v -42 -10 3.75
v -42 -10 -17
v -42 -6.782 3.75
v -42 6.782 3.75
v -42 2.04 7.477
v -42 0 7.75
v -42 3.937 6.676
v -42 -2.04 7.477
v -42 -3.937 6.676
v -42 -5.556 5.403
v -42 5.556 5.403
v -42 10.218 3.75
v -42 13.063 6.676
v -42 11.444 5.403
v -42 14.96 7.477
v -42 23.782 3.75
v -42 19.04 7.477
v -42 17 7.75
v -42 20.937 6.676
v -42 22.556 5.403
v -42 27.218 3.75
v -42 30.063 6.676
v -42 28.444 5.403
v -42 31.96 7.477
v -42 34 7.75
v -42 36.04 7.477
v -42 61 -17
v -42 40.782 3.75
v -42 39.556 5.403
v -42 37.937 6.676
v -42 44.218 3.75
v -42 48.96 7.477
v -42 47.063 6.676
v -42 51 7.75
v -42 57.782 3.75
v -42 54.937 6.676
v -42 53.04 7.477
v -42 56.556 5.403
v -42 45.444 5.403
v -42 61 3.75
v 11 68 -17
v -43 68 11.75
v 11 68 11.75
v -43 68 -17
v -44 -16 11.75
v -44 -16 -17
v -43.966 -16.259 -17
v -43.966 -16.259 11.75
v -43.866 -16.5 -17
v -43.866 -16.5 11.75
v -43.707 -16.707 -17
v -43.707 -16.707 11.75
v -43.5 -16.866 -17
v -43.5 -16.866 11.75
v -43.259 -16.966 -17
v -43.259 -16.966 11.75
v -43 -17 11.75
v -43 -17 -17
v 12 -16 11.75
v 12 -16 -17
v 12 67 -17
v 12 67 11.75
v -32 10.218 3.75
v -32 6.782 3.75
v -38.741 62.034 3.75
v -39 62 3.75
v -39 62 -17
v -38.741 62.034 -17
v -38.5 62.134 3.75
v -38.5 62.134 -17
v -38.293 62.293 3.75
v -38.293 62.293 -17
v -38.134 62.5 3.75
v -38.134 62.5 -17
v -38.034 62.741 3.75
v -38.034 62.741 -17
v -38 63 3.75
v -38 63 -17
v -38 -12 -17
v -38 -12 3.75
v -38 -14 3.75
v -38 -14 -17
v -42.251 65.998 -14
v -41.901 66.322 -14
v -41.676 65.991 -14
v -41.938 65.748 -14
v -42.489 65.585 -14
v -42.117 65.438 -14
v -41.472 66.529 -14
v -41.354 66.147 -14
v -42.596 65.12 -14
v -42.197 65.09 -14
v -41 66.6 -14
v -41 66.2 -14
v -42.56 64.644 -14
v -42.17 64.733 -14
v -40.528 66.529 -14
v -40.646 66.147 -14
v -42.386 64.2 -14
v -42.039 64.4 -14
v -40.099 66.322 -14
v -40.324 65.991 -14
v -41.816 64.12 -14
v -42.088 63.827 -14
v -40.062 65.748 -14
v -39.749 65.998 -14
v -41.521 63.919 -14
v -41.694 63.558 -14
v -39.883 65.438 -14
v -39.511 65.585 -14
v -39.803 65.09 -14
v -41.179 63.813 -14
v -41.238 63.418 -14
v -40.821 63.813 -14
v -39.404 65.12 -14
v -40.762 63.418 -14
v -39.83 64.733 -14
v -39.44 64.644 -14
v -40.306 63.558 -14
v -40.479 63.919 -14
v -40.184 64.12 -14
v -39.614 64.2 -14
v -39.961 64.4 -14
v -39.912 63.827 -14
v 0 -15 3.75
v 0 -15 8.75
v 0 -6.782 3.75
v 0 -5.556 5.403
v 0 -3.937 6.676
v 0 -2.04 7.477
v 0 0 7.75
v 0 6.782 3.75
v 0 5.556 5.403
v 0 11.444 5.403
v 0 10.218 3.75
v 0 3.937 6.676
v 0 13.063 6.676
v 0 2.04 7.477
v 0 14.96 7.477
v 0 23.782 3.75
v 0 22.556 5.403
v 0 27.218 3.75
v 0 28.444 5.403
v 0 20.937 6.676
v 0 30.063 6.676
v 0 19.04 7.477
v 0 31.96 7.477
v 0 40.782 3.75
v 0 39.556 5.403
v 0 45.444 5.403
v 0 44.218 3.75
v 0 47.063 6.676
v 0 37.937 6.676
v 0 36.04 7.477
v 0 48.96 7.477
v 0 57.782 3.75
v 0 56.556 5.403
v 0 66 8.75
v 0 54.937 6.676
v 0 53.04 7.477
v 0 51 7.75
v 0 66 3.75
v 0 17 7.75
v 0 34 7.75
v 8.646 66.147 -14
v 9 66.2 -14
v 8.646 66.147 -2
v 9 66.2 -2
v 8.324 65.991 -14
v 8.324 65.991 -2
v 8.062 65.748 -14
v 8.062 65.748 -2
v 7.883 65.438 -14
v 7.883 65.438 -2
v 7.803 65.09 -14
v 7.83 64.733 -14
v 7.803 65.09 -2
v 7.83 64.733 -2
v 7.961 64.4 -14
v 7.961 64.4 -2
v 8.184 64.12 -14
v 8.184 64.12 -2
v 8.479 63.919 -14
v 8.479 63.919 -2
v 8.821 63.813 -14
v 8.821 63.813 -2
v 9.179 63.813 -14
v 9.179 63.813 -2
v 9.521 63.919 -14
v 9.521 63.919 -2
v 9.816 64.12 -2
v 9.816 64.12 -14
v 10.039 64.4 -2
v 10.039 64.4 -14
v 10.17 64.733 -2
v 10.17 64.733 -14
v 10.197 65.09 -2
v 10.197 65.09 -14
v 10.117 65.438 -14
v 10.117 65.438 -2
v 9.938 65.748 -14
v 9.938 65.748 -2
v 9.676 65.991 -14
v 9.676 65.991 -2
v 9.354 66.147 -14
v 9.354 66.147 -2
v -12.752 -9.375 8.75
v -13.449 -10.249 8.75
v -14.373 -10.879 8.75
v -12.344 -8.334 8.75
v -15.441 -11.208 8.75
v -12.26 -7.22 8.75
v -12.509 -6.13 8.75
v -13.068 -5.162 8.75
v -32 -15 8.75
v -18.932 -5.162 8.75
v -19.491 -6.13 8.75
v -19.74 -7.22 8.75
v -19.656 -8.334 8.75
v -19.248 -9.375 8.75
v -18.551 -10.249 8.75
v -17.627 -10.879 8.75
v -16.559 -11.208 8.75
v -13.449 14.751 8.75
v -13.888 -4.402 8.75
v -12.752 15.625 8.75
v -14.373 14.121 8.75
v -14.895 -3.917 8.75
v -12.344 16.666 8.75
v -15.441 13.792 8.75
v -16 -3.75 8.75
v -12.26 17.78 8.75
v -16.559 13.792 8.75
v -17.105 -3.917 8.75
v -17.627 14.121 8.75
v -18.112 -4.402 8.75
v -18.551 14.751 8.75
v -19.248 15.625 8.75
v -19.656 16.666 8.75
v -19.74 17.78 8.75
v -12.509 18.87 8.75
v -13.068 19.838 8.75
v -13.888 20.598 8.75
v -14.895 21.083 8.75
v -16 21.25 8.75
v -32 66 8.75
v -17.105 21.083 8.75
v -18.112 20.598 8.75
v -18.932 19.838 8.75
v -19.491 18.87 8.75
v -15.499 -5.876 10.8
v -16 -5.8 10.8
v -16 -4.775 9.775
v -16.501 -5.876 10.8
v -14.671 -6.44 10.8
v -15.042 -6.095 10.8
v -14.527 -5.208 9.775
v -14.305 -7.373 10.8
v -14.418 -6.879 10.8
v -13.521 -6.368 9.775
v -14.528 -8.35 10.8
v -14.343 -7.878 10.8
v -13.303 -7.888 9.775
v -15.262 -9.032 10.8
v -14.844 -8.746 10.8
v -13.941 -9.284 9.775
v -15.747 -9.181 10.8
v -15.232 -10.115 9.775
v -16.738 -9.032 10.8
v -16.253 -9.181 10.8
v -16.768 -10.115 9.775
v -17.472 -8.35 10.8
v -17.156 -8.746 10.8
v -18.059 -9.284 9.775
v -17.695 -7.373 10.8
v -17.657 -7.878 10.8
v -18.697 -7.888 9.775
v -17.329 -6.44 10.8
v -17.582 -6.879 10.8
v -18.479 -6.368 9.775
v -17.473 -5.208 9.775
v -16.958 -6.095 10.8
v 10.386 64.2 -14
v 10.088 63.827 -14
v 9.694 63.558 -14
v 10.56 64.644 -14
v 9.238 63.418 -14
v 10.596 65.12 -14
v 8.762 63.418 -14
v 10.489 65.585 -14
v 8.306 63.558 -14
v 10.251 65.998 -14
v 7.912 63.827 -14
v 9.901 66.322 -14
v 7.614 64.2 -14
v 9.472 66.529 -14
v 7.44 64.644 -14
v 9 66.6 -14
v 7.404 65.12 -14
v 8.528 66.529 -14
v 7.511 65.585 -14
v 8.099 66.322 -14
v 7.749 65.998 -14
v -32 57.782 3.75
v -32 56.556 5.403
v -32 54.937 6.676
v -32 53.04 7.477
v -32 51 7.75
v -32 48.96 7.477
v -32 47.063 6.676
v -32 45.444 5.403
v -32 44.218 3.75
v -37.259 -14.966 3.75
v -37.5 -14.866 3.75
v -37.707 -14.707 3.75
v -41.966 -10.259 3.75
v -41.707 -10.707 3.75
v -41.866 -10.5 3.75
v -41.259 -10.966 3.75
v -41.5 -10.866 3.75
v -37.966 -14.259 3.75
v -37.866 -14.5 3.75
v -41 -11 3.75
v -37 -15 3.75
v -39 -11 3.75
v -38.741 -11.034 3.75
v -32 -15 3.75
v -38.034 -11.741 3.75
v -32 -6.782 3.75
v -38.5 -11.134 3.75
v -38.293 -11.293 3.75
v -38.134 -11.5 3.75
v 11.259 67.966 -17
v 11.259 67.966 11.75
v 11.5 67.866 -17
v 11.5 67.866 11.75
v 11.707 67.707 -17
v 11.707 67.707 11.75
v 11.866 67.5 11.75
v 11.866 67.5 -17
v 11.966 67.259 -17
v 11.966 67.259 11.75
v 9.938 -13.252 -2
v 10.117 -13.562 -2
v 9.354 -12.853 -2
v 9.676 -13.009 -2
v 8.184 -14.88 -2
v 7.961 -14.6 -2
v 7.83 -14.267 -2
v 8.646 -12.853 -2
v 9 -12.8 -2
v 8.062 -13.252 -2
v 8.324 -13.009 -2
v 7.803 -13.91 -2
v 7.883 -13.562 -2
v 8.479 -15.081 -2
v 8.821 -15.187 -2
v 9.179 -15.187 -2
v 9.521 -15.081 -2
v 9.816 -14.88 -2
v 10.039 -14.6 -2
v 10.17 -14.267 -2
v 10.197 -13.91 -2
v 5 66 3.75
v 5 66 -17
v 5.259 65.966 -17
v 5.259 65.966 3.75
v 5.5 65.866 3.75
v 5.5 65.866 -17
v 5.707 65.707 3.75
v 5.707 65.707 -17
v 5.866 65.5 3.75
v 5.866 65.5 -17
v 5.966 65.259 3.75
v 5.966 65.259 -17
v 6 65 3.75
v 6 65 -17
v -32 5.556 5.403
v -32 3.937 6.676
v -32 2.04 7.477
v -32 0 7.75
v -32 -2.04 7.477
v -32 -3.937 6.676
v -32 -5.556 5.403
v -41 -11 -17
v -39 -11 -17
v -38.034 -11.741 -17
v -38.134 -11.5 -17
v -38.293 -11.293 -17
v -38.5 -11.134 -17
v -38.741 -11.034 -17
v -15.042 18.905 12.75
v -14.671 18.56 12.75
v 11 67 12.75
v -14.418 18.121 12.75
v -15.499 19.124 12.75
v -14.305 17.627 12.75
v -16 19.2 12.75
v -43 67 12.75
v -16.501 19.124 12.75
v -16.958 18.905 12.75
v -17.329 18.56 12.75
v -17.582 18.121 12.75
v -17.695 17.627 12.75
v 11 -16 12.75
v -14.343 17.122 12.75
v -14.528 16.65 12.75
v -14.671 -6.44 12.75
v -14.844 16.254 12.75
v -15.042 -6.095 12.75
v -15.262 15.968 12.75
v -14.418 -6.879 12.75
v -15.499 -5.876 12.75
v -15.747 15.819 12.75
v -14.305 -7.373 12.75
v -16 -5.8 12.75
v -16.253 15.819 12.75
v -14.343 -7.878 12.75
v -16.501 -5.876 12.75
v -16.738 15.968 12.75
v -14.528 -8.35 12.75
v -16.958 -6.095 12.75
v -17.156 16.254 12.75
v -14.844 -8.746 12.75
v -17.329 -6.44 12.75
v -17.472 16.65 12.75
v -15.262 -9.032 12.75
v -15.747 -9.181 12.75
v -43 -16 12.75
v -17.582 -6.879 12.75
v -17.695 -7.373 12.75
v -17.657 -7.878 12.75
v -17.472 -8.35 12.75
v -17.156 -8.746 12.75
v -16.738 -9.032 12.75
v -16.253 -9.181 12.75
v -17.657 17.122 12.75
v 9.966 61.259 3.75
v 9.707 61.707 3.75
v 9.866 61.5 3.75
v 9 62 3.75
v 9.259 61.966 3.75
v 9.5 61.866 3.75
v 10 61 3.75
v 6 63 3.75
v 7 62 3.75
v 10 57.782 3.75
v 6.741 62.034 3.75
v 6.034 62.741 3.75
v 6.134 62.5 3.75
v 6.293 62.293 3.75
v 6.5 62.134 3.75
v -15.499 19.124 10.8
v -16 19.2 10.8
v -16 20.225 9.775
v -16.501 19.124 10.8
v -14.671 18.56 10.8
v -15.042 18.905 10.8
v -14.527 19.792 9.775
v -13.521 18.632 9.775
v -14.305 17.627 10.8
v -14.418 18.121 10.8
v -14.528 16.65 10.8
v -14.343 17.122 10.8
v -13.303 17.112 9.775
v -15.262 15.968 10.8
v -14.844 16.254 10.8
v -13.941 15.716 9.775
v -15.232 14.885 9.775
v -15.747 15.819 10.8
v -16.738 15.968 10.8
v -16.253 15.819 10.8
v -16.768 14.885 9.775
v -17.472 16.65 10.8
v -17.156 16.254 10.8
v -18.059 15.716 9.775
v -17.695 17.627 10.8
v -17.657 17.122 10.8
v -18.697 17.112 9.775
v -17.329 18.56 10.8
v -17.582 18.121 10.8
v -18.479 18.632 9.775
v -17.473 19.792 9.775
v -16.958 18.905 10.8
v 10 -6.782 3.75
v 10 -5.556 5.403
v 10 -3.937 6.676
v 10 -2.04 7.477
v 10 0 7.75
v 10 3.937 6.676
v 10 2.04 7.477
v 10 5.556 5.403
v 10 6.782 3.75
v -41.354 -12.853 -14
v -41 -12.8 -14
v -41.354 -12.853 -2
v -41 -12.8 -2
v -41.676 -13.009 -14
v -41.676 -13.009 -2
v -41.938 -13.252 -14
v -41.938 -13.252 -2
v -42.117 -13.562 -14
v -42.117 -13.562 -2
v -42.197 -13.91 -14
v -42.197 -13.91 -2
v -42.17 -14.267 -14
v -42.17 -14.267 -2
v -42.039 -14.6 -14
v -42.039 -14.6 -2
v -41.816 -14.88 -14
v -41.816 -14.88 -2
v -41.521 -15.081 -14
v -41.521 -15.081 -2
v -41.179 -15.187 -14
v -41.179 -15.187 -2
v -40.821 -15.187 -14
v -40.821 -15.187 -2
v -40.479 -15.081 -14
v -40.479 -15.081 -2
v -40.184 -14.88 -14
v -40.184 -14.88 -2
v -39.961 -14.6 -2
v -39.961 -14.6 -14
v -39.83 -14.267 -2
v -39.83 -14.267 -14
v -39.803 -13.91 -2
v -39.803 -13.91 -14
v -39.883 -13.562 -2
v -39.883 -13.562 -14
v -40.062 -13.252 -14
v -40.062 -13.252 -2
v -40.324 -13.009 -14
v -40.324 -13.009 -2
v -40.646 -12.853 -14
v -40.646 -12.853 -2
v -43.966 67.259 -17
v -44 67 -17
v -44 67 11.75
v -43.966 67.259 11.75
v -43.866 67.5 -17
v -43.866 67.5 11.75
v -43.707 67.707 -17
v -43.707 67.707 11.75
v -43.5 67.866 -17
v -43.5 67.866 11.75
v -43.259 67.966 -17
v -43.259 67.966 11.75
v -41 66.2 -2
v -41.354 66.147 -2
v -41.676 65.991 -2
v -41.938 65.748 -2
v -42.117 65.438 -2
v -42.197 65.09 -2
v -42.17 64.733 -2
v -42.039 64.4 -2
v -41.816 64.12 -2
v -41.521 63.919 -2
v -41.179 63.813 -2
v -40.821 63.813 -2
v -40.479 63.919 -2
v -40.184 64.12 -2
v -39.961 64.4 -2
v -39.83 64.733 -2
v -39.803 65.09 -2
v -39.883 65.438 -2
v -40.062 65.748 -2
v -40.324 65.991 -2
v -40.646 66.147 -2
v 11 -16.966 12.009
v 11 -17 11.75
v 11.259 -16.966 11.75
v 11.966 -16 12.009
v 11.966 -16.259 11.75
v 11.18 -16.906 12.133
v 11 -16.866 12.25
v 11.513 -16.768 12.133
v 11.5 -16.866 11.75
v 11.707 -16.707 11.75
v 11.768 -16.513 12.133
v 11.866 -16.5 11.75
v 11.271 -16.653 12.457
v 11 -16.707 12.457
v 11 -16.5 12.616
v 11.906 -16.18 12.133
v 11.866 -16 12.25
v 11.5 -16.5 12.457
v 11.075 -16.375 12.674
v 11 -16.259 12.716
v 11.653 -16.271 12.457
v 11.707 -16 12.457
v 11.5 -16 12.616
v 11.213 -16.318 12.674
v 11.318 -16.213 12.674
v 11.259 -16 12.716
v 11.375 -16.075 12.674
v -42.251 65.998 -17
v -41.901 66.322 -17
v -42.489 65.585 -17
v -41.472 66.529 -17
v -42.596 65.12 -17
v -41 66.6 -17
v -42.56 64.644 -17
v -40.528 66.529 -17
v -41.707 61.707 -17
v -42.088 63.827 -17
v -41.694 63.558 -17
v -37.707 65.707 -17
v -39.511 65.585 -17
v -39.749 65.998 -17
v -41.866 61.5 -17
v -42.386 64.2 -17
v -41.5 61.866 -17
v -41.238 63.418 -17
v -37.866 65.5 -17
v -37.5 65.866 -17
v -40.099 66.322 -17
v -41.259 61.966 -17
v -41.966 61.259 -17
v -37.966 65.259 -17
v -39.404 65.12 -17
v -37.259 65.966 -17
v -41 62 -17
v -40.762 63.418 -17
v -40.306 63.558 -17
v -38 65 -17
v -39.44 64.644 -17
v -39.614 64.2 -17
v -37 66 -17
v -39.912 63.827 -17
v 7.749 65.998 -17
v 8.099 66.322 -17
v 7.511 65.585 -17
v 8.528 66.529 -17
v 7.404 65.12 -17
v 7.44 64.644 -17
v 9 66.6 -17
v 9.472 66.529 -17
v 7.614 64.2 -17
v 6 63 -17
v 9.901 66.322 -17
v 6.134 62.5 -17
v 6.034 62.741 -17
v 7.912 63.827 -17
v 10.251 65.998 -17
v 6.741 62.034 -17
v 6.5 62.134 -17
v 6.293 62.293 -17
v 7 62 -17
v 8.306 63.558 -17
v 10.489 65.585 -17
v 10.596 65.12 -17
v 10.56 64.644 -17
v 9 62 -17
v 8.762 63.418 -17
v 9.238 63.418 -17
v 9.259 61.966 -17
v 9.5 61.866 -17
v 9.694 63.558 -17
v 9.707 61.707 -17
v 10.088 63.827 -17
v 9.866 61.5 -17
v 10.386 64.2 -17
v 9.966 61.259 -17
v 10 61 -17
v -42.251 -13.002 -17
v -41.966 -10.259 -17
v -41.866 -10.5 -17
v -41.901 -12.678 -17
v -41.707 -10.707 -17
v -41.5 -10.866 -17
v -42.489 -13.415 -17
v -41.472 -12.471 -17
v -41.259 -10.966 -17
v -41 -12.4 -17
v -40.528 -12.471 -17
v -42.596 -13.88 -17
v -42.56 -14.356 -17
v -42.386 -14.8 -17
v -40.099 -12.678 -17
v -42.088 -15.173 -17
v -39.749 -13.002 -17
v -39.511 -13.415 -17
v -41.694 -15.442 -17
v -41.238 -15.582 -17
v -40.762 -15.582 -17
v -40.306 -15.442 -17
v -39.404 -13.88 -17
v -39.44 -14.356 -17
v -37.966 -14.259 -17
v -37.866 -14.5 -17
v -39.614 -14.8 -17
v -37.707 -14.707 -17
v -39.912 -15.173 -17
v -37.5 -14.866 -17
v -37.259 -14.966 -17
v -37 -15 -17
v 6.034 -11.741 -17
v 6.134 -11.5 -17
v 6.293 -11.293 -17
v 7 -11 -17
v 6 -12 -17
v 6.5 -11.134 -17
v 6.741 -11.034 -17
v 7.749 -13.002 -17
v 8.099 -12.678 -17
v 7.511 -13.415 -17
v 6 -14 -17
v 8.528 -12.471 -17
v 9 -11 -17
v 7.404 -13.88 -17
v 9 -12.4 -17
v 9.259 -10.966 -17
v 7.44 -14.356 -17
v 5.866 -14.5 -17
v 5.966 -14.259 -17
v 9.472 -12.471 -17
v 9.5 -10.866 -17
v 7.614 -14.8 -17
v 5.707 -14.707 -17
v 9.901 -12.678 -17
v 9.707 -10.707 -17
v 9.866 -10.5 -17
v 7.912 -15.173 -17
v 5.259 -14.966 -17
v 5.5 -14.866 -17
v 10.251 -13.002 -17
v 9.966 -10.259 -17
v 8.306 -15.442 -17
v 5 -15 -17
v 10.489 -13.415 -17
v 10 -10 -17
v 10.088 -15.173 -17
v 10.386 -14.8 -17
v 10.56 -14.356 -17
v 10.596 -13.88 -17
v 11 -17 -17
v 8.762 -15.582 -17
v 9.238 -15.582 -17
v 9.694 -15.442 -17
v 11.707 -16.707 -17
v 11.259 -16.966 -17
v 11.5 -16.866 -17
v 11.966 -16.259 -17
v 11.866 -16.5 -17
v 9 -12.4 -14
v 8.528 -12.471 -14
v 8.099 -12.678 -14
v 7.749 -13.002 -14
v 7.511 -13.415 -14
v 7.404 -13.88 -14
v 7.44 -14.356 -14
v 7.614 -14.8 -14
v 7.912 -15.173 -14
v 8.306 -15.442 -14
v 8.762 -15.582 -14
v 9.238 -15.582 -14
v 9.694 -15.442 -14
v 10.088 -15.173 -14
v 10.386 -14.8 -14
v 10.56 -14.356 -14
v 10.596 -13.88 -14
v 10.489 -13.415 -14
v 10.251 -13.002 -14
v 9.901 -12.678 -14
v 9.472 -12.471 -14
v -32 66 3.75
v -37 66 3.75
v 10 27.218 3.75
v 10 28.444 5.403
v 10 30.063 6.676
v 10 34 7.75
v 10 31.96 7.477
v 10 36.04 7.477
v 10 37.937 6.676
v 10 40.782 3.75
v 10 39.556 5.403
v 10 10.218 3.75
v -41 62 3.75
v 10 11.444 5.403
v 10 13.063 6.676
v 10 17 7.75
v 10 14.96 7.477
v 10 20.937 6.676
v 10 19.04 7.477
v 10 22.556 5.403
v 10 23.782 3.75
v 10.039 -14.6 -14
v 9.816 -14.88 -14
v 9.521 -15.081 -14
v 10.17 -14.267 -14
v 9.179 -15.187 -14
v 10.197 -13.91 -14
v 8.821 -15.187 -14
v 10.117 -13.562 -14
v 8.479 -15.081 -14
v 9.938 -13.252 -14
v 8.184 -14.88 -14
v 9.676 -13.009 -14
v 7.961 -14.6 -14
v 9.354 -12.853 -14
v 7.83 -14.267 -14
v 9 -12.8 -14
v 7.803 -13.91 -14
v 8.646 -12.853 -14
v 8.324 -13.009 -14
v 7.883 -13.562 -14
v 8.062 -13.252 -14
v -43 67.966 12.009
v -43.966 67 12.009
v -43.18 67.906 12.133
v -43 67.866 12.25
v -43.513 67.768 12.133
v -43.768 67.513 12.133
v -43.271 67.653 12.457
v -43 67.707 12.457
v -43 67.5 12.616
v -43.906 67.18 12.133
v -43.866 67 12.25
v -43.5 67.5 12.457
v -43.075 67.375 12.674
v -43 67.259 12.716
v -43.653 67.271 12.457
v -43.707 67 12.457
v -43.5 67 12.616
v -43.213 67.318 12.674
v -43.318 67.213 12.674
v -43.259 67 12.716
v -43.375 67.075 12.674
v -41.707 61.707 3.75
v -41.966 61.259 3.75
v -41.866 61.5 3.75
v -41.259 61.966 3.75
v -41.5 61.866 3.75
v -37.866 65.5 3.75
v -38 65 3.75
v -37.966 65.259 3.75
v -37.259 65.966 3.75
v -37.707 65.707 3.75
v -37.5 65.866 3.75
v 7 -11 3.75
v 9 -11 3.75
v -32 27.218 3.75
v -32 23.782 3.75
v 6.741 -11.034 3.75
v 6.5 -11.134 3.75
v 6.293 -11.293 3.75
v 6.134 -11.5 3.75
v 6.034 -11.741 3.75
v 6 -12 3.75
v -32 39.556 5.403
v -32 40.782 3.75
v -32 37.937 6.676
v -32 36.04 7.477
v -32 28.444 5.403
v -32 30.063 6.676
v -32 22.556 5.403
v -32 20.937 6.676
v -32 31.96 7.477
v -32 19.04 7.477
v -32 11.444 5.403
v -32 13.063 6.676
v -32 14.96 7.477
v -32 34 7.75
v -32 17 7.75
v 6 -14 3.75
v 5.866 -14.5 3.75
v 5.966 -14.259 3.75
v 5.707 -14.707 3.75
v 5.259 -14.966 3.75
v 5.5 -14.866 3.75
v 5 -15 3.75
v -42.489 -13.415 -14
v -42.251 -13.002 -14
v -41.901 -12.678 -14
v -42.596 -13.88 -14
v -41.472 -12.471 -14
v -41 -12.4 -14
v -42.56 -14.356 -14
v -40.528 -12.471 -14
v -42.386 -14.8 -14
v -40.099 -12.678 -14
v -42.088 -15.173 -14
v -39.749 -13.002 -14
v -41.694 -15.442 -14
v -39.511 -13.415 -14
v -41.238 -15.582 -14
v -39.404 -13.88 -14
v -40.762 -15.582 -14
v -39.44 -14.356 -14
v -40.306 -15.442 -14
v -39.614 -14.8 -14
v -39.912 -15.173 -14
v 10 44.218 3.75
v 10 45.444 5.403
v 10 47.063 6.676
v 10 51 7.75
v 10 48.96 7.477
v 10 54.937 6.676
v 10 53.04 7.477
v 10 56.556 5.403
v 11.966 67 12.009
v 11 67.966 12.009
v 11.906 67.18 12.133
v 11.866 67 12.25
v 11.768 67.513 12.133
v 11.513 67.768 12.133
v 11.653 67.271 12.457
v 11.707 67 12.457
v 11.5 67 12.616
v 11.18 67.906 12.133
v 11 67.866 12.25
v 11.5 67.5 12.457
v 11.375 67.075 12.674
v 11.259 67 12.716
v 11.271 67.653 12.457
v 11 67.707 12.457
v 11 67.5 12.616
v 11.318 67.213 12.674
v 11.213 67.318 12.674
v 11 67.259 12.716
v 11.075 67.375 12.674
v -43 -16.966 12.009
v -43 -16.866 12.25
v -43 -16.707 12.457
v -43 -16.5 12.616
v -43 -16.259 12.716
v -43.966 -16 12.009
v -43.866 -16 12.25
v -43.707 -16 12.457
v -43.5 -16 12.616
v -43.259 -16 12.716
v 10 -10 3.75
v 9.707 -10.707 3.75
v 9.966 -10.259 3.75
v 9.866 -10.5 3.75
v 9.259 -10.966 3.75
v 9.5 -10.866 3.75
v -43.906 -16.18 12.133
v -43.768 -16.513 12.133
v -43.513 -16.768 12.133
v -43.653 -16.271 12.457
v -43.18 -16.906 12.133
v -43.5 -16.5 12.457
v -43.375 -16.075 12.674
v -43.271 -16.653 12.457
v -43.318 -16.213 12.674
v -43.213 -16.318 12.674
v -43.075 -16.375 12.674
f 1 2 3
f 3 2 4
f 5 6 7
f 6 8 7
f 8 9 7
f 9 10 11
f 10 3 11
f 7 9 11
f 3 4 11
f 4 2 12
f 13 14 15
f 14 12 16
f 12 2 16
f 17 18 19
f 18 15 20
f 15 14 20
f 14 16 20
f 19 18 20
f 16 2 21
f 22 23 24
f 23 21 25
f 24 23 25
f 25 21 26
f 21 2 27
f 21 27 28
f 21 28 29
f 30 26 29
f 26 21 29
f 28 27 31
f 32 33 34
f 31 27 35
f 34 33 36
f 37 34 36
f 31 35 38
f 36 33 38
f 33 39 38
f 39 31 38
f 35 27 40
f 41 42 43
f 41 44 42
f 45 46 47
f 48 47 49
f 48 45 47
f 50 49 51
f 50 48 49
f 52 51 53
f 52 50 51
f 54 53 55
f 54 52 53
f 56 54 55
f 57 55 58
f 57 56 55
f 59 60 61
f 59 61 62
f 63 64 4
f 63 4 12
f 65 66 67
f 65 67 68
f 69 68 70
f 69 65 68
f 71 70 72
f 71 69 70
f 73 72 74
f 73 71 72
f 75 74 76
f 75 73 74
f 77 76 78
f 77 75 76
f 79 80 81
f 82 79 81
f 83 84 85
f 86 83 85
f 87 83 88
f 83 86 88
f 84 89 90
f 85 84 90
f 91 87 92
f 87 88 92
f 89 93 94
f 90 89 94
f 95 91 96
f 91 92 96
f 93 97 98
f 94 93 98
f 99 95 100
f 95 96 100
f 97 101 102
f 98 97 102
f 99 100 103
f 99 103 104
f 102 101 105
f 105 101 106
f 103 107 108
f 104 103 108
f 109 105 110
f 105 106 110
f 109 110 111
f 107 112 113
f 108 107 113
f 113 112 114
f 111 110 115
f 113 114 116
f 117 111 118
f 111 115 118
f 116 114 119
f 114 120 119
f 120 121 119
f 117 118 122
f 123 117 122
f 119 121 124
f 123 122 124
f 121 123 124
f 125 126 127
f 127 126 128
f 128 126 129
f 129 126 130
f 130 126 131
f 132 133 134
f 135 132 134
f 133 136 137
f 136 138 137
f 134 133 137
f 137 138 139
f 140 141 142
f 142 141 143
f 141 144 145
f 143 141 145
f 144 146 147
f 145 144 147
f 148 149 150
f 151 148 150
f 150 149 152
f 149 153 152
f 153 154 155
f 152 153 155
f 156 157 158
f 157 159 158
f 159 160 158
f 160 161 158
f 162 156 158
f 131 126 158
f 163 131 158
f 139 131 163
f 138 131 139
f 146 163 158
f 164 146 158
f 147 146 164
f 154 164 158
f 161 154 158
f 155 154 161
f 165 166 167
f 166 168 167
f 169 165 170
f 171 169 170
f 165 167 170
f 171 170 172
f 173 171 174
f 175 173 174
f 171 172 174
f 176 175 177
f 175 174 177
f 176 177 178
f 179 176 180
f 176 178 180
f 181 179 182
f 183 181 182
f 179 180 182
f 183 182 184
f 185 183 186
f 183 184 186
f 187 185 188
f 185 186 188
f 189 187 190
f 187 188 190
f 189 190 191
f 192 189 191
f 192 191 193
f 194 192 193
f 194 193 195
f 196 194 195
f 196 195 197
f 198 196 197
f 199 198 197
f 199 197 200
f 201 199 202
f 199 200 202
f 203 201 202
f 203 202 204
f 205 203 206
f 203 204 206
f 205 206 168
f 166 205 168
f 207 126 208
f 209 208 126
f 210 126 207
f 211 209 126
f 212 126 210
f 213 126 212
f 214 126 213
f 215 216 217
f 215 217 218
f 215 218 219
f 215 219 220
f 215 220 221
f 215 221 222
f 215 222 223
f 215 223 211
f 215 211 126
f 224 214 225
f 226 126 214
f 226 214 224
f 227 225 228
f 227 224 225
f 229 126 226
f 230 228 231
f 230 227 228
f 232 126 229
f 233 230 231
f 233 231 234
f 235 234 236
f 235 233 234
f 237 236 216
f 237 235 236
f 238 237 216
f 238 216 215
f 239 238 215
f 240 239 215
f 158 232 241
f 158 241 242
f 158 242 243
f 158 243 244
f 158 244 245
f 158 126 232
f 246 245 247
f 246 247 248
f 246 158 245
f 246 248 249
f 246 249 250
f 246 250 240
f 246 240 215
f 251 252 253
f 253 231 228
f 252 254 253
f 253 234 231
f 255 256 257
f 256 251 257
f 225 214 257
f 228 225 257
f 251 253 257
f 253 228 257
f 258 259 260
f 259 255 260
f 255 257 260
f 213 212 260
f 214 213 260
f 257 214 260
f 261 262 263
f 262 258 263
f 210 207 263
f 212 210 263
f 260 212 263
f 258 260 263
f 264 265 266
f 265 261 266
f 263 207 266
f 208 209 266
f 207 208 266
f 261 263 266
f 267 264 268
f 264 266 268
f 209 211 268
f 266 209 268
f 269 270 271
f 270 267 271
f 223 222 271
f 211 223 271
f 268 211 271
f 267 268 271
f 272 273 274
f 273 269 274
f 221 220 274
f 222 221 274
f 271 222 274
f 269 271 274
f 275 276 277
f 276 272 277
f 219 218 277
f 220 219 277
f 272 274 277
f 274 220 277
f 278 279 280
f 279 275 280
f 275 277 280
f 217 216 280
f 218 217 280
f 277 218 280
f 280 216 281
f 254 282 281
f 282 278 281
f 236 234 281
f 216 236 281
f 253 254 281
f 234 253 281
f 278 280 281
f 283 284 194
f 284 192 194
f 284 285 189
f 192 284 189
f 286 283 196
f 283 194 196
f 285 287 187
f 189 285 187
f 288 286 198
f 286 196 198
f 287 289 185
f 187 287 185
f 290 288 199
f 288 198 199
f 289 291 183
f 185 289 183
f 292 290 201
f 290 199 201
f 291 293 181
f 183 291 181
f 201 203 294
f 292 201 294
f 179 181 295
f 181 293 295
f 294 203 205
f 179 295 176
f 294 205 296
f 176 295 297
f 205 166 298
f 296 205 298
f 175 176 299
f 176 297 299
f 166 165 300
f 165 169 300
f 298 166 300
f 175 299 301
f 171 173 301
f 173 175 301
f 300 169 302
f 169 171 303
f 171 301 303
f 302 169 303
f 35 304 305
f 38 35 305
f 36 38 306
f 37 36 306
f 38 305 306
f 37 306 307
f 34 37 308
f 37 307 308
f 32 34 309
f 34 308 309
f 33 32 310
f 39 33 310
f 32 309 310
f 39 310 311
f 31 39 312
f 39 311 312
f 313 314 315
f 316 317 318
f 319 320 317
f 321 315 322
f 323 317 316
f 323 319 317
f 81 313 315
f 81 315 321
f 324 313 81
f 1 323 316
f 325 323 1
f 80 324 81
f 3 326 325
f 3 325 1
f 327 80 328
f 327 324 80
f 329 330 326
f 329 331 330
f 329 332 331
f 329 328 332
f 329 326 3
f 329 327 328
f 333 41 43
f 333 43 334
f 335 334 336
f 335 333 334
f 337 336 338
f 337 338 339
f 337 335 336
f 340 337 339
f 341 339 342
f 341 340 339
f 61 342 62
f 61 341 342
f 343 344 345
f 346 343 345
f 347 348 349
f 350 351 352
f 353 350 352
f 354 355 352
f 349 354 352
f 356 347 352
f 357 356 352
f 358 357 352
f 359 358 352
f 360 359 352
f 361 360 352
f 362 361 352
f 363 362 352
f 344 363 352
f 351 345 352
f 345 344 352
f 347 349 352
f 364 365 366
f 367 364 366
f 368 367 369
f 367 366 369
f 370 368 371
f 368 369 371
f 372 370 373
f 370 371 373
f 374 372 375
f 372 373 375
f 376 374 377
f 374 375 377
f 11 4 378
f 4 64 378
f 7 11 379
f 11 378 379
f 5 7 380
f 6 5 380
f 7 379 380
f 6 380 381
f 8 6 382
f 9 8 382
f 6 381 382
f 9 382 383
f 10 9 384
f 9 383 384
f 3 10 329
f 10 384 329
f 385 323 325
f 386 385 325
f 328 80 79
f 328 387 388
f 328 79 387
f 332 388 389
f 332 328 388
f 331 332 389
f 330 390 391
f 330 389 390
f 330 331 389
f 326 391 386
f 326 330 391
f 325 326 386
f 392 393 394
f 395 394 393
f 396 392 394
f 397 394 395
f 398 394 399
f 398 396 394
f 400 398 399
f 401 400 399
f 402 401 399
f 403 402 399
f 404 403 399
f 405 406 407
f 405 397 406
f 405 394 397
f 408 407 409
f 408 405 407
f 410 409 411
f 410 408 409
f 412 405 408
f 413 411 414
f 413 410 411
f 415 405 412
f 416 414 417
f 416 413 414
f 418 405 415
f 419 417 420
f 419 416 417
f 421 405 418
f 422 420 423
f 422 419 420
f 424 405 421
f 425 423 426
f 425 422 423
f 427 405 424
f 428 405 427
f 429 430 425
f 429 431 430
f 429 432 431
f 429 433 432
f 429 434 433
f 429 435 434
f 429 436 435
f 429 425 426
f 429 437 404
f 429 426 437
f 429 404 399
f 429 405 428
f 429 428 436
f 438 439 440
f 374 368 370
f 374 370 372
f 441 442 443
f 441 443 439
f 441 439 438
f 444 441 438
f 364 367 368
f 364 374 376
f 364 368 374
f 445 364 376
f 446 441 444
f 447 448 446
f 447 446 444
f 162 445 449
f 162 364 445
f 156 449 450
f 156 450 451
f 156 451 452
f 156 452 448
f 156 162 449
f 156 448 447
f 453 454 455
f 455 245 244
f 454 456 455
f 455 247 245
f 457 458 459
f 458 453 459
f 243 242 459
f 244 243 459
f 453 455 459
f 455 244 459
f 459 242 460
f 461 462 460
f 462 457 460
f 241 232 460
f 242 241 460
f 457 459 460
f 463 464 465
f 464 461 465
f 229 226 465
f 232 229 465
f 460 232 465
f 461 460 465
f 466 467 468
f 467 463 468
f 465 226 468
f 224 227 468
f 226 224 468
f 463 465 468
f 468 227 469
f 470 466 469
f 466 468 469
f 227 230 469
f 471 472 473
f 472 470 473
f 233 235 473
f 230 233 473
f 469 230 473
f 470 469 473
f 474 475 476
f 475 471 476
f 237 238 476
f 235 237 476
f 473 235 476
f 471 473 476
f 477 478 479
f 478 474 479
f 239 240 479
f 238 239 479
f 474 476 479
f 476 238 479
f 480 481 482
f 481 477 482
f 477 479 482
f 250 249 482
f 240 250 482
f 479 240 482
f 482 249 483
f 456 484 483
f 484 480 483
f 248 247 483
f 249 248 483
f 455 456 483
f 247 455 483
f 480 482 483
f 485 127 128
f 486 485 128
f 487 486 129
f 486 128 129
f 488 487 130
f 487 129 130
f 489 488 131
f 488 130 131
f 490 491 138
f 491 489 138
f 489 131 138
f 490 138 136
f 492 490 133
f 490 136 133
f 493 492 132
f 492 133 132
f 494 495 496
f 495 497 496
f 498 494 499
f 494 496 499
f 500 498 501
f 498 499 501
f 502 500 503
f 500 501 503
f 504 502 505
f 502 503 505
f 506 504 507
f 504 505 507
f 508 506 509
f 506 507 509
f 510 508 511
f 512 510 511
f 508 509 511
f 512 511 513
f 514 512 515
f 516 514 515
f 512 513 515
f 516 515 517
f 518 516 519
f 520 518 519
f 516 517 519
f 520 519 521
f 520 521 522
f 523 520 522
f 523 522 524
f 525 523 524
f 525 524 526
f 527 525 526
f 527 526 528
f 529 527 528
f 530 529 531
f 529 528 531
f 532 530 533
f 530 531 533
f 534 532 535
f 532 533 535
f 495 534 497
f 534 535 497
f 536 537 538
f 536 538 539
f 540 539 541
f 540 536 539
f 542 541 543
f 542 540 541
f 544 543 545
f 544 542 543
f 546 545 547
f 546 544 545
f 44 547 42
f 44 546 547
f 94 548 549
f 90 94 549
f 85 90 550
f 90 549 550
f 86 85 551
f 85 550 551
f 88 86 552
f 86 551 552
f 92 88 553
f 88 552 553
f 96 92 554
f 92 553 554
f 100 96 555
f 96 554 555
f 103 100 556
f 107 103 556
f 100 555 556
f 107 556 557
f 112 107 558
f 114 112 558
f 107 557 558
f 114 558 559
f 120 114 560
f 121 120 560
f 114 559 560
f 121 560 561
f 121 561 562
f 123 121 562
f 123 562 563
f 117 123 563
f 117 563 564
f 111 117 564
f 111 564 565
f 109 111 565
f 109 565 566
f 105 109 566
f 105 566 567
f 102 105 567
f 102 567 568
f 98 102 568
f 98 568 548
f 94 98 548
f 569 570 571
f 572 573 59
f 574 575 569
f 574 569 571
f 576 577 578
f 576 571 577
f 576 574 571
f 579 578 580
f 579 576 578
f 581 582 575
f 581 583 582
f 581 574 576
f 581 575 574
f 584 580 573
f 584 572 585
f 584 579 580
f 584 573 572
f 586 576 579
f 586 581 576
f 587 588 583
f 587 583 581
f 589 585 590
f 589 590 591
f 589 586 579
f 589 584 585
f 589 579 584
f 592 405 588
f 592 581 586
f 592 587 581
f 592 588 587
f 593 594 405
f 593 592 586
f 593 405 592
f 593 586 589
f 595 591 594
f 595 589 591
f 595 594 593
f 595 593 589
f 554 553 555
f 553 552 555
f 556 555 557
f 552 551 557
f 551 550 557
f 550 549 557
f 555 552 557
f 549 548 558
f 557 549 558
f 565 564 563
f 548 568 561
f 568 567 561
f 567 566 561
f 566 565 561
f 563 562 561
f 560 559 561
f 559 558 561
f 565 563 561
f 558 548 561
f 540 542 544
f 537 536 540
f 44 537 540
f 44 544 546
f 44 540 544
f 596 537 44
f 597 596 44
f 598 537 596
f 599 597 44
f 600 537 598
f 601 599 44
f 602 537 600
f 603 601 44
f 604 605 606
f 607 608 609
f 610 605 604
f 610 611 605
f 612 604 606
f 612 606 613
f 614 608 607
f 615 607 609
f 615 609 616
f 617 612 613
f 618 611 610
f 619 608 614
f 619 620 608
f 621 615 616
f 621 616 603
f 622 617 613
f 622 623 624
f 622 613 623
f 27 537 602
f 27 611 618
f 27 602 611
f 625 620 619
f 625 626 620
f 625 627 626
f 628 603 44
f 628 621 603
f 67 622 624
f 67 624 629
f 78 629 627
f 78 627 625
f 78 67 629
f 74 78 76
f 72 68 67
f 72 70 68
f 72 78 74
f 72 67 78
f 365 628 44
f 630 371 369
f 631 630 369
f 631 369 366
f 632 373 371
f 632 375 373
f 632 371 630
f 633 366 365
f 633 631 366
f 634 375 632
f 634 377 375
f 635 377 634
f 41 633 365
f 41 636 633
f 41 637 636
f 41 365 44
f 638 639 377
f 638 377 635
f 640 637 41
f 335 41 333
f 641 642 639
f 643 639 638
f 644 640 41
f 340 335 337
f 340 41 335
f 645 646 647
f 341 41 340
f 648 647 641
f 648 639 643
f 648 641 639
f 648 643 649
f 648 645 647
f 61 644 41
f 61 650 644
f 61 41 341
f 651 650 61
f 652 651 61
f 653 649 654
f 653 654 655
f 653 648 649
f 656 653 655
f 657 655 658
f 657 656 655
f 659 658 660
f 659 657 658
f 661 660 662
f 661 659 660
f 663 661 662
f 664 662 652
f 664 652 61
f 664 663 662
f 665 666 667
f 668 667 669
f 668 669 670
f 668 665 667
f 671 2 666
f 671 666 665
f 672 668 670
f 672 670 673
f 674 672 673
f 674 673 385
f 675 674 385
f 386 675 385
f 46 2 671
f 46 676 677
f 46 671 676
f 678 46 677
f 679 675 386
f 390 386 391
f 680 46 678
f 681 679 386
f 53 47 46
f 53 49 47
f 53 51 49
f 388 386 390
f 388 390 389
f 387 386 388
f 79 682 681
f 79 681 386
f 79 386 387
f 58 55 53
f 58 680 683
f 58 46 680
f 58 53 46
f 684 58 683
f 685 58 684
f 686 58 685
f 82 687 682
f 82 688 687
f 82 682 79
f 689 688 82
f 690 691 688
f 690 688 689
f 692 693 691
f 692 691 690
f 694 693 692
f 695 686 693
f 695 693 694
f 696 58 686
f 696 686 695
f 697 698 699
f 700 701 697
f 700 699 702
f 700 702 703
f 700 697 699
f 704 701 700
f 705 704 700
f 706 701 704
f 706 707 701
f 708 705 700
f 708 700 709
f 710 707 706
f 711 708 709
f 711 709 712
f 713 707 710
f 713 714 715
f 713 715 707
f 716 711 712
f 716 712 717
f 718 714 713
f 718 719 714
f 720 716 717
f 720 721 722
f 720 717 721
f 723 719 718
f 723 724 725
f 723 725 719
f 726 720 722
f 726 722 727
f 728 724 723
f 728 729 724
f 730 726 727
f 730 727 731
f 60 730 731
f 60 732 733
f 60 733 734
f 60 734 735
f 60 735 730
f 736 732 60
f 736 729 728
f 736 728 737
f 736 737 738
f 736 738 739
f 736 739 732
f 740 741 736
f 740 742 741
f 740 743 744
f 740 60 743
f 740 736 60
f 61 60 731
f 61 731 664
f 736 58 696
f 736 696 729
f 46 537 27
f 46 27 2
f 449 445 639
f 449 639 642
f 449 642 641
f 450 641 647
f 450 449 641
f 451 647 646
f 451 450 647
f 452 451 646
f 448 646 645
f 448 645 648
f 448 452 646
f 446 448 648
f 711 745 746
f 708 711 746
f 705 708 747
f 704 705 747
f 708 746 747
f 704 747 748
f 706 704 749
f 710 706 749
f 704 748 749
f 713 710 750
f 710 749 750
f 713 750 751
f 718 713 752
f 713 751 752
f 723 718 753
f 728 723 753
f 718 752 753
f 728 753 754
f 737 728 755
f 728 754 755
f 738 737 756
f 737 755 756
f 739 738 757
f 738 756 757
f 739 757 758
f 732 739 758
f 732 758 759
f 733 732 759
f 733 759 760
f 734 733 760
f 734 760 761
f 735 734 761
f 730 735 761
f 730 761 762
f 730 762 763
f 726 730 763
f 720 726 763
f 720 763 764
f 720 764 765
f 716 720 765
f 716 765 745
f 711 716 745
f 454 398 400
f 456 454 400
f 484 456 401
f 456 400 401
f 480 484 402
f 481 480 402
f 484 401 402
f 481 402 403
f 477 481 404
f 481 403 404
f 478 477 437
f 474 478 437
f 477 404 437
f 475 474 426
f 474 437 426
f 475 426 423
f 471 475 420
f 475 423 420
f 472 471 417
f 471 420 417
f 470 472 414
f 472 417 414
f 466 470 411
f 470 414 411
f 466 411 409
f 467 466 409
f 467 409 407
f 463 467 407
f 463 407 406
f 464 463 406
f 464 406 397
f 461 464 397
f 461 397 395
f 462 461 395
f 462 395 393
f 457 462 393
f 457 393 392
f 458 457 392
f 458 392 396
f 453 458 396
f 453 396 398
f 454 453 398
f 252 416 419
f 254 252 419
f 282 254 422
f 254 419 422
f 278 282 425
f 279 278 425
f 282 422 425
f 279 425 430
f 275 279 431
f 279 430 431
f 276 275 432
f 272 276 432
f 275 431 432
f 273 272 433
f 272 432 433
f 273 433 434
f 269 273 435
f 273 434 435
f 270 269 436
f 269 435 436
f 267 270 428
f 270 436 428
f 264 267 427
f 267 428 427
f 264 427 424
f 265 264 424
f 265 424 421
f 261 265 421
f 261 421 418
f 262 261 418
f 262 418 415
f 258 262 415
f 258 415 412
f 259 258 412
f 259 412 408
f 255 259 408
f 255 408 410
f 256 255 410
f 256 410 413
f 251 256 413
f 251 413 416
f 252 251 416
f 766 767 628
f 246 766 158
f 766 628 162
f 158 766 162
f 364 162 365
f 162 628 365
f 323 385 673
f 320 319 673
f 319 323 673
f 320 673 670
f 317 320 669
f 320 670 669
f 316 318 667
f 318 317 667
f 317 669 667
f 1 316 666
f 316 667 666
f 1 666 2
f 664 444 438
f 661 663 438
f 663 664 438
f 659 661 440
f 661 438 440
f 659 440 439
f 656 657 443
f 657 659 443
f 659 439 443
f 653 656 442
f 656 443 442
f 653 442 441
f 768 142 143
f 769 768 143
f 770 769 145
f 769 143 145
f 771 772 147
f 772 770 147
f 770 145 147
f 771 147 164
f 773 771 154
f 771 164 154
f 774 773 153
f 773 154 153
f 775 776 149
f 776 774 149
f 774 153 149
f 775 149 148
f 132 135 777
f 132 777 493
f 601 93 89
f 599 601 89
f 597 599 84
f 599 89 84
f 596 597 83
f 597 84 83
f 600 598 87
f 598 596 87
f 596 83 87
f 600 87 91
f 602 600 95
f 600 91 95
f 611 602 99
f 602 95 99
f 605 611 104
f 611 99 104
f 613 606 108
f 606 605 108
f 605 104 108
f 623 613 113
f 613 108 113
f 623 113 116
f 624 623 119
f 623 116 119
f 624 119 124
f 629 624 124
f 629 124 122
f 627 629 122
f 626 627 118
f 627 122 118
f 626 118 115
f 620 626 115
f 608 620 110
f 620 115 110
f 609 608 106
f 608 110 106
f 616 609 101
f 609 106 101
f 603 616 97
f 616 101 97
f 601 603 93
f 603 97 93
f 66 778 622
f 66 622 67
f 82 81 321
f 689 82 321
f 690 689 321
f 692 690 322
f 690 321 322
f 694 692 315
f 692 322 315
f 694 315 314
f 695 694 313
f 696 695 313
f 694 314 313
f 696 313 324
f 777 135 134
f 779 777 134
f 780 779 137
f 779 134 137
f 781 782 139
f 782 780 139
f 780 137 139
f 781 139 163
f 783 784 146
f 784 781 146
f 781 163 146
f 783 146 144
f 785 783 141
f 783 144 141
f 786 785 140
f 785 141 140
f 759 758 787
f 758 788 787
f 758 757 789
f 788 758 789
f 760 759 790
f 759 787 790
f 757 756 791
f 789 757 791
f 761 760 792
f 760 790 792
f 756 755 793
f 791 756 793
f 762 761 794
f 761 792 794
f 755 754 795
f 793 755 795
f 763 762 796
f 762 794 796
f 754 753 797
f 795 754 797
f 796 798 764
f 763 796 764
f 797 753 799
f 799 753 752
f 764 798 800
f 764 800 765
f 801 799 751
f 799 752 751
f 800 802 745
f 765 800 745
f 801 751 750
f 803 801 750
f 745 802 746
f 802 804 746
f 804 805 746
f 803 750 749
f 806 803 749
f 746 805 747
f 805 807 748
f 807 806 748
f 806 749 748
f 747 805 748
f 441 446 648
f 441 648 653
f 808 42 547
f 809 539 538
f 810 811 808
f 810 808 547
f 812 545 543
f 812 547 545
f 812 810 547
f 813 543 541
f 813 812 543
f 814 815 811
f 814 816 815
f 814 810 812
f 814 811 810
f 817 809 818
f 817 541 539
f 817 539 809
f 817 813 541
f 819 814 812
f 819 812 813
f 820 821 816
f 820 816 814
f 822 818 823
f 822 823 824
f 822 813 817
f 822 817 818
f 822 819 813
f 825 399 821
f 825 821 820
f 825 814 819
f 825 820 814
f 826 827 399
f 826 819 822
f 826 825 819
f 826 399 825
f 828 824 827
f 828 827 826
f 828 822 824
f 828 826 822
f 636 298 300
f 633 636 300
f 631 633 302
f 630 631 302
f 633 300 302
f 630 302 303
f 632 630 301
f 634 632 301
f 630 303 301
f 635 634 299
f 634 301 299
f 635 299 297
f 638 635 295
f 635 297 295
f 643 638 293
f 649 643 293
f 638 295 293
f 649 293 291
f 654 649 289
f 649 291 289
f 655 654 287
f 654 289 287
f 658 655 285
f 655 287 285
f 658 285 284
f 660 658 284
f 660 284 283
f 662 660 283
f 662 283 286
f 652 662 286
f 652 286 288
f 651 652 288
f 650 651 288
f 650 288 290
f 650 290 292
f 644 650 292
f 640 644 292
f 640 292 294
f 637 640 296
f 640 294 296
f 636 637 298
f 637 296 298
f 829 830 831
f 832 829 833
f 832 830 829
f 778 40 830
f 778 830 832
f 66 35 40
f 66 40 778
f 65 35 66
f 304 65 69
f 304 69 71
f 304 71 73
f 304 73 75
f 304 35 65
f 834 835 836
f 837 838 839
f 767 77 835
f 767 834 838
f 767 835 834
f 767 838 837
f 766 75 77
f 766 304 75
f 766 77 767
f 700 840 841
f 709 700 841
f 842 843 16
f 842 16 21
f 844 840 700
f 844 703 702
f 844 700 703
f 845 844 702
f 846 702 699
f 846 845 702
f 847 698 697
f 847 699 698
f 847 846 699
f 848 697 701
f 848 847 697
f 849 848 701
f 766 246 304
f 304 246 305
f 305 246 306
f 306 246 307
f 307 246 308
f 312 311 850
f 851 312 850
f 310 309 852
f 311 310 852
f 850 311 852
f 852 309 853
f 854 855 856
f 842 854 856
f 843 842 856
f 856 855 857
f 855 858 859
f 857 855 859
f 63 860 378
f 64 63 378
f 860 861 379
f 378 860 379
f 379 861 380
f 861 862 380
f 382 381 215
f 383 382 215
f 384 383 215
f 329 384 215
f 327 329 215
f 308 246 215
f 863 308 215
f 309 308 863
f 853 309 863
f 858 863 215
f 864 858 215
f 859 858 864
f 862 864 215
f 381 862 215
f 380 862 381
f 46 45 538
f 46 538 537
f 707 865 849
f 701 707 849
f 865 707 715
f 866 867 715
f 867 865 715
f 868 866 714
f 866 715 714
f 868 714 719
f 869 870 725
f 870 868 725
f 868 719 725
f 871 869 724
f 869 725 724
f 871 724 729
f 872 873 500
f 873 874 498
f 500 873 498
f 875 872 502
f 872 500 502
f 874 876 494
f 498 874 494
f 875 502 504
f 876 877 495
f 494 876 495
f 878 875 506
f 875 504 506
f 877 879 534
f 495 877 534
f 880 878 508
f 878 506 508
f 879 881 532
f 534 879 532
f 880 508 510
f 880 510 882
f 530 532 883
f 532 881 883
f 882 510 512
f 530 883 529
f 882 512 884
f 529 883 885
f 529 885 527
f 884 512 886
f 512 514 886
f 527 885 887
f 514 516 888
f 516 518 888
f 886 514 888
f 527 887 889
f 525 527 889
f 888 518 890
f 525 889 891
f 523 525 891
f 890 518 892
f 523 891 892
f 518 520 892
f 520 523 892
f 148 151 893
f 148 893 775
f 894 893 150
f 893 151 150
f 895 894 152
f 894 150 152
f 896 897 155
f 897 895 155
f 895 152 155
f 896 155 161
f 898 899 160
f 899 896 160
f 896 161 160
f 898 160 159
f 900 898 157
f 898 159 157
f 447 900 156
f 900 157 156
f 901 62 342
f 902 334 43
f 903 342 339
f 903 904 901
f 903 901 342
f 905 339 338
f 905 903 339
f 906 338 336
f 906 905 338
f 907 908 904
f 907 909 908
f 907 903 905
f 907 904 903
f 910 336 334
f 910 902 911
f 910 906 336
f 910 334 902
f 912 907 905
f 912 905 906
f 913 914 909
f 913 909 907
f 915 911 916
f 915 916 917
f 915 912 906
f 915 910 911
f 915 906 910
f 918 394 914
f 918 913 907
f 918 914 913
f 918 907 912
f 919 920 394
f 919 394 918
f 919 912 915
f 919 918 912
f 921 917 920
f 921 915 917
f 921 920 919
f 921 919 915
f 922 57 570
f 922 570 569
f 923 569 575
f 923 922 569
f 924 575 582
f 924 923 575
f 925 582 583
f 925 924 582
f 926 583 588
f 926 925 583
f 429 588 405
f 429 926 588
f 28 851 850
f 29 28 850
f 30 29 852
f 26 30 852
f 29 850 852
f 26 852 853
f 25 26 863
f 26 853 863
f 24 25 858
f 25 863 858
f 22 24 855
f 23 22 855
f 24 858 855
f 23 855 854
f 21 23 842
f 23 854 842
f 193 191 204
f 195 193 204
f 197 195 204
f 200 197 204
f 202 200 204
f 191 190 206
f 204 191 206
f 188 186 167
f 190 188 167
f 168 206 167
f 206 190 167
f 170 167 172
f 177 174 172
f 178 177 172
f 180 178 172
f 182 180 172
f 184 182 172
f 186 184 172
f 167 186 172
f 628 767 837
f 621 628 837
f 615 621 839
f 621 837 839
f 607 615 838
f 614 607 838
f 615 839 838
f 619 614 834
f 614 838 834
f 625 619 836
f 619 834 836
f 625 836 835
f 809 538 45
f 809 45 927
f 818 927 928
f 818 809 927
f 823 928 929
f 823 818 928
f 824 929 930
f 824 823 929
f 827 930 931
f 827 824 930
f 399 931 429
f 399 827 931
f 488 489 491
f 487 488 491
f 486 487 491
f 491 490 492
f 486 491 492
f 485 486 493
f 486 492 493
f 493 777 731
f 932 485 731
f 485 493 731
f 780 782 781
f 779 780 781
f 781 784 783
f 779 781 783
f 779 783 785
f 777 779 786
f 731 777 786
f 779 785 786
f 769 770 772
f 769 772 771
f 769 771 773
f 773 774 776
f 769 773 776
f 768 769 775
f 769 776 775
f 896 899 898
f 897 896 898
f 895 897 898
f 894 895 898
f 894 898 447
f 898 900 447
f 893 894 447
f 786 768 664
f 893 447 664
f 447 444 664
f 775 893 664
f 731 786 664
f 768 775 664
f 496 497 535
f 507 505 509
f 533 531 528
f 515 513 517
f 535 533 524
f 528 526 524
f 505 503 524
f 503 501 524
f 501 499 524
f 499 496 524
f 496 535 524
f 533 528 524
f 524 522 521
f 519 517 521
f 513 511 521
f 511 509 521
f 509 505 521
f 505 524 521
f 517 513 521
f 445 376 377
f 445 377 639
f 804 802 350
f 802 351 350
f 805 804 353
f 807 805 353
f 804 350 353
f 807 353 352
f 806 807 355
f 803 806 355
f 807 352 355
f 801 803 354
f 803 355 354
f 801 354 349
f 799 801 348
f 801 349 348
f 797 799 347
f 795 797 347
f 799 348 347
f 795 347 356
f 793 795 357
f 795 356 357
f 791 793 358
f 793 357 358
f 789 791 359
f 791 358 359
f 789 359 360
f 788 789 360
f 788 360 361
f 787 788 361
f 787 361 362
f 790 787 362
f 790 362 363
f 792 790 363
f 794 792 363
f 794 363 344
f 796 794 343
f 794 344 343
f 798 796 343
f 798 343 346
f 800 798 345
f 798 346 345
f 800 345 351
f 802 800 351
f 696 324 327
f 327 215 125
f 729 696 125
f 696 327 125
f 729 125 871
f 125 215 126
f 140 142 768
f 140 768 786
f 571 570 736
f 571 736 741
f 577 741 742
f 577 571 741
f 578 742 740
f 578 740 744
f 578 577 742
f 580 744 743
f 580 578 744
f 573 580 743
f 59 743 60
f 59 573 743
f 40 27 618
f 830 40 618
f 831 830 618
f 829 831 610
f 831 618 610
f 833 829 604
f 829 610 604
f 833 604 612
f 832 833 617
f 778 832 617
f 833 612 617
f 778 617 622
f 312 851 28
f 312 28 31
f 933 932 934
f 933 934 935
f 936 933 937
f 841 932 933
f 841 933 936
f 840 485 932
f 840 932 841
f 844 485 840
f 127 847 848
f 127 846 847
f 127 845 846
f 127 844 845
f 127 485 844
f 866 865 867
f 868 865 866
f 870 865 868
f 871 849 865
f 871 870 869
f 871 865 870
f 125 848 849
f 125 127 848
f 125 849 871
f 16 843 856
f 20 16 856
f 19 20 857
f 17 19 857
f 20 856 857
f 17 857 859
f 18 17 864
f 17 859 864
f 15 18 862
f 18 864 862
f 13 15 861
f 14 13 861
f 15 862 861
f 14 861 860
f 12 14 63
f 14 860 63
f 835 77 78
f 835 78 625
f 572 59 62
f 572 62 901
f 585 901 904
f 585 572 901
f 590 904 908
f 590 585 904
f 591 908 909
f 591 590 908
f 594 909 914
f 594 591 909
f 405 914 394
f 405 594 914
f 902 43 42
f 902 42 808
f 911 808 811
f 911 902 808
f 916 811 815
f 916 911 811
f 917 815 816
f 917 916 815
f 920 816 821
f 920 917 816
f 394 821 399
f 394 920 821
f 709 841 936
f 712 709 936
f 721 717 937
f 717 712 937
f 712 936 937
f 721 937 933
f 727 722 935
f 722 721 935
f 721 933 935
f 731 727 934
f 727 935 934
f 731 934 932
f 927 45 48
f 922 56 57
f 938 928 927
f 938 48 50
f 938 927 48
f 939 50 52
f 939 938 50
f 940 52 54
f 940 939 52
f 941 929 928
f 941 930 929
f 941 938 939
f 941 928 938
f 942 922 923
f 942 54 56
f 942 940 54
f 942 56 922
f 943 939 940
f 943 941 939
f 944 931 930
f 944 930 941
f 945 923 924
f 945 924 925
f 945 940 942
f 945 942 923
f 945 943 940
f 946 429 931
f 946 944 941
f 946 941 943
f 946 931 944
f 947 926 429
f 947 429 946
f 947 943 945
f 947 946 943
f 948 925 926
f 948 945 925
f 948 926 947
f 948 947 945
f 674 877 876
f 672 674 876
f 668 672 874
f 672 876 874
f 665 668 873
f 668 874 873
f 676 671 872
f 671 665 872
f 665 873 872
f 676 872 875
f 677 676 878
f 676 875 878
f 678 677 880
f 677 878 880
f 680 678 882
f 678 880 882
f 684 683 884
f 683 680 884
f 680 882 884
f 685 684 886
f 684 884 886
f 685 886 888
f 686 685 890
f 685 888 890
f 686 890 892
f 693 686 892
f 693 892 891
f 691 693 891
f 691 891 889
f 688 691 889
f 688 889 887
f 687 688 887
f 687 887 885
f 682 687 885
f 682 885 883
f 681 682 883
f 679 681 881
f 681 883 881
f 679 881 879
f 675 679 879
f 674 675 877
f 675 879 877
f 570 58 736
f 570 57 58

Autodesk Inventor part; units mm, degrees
ref_plane "YZ Plane" through (0, 0, 0) normal (1, 0, 0) x (0, 1, 0)
ref_plane "XZ Plane" through (0, 0, 0) normal (0, 1, 0) x (-1, 0, 0)
ref_plane "XY Plane" through (0, 0, 0) normal (0, 0, 1) x (1, 0, 0)
sketch "Skizze1" plane through (0, 0, 0) normal (1, 0, 0) x (0, 1, 0)
  circle A0 centre (0, 0) radius 7.75
  line L0 (0, 0) -> (7.75, 0) construction
  circle A1 centre (17, 0) radius 7.75
  circle A2 centre (34, 0) radius 7.75
  circle A3 centre (51, 0) radius 7.75
  line L1 (66, 3.75) -> (-15, 3.75)
  line L2 (-15, 3.75) -> (-15, 9.75)
  line L3 (-15, 9.75) -> (66, 9.75)
  line L4 (66, 9.75) -> (66, 3.75)
  point P0 (24.75, 0)
  point P1 (41.75, 0)
  point P2 (58.75, 0)
  point P3 (66, 6.75)
  point P4 (-6.7823, 3.75)
  point P5 (6.7823, 3.75)
  point P6 (10.2177, 3.75)
  point P7 (23.7823, 3.75)
  point P8 (27.2177, 3.75)
  point P9 (40.7823, 3.75)
  point P10 (44.2177, 3.75)
  point P11 (57.7823, 3.75)
  dimension "d0" = 15.5
  dimension "d3" = 17
  dimension "a" = 9.75
  dimension "b" = 15
  dimension "d10" = 15
  dimension "d11" = 6
extrude "Extrusion1" add sketch "Skizze1" along normal blind 10 contours A0 L1 L2 L3 L4 A3 A2 A1
sketch "Skizze2" plane through (0, -15, 9.75) normal (0, 0, 1) x (1, 0, 0)
  line L0 (0, 81) -> (10, 81) projected
  line L1 (10, 81) -> (-16, 81)
  line L2 (-16, 81) -> (-16, 0)
  line L3 (-16, 0) -> (10, 0)
  line L4 (10, 0) -> (10, 81)
  line L5 (0, 0) -> (10, 0) projected
  point P0 (0, 15)
  dimension "d14" = 26
extrude "Extrusion2" add sketch "Skizze2" along normal blind 3
sketch "Skizze3" plane through (10, 0, 0) normal (1, 0, 0) x (0, 0, -1)
  line L0 (-12.75, 66) -> (-12.75, -15) projected
  line L1 (-12.75, 66) -> (17, 66)
  line L2 (17, 66) -> (17, -15)
  line L3 (17, -15) -> (-12.75, -15)
  line L4 (-12.75, -15) -> (-12.75, 66)
  line L5 (-3.75, -15) -> (-12.75, -15) construction
  circle A0 centre (17, 51) radius 2.5 construction
  point P0 (0, 0)
  point P1 (-12.75, -15)
extrude "Extrusion3" add sketch "Skizze3" along normal blind 2
sketch "Skizze4" plane through (-16, -15, 9.75) normal (0, -1, 0) x (1, 0, 0)
  line L0 (0, 3) -> (28, 3) projected
  line L1 (28, -26.75) -> (28, 3) projected
  line L2 (0, 3) -> (28, 3)
  line L3 (28, 3) -> (28, -26.75)
  line L4 (28, -26.75) -> (0, -26.75)
  line L5 (0, -26.75) -> (0, 3)
  point P0 (16, -9.75)
extrude "Extrusion4" add sketch "Skizze4" along normal blind 2
sketch "Skizze5" plane through (-16, 66, 9.75) normal (0, 1, 0) x (1, 0, 0)
  line L0 (0, 0) -> (0, 26.75) projected
  line L1 (28, -3) -> (0, -3)
  line L2 (0, -3) -> (0, 26.75)
  line L3 (0, 26.75) -> (28, 26.75)
  line L4 (28, 26.75) -> (28, -3)
  point P0 (16, 9.75)
extrude "Extrusion5" add sketch "Skizze5" along normal blind 2
sketch "Skizze6" plane through (10, -15, -17) normal (0, 0, -1) x (-1, 0, 0)
  line L0 (-2, -2) -> (26, -2) projected
  line L1 (-2, -2) -> (4, -2)
  line L2 (4, -2) -> (4, 4)
  line L3 (4, 4) -> (-2, 4)
  line L4 (-2, 4) -> (-2, -2)
  line L5 (-2, 83) -> (26, 83) projected
  line L6 (-2, 83) -> (4, 83)
  line L7 (4, 83) -> (4, 77)
  line L8 (4, 77) -> (-2, 77)
  line L9 (-2, 77) -> (-2, 83)
  point P0 (10, 15)
  point P1 (4, 83)
  dimension "d23" = 6
extrude "Extrusion6" add sketch "Skizze6" against normal up to surface (20.75 mm away)
fillet "Rundung1" radius 1 8 edges at (10, -11, -6.625) (6, -11, -6.625) (6, -15, -6.625) (12, -17, -2.125) (12, 68, -2.125) (10, 62, -6.625) (6, 62, -6.625) (6, 66, -6.625)
sketch "Skizze8" plane through (5, 66, -17) normal (0, 0, -1) x (-1, 0, 0)
  arc A0 (-6, 2) -> (-7, 1) centre (-6, 1) ccw construction
  arc A1 (-2, -4) -> (-1, -3) centre (-2, -3) ccw construction
  line L0 (-6, 1) -> (-2, -3) construction
  arc A2 (-7, -82) -> (-6, -83) centre (-6, -82) ccw construction
  line L1 (-6, -82) -> (-2, -78) construction
  point P0 (5, -66)
  point P1 (-4, -80)
  point P2 (-4, -1)
hole "Bohrung1" at (9, -14, -17) at (9, 65, -17) direction (0, 0, 1) diameter 3.2 depth 3
hole "Bohrung2" at (9, 65, -17) at (9, -14, -17) direction (0, 0, 1) diameter 2.4 depth 15 clearance for "Inbusschraube ISO 4762" size "M2" standard "ISO"
mirror "Spiegeln1" about plane through (-16, 66, 9.75) normal (-1, 0, 0) of "Extrusion1", "Extrusion2", "Extrusion3", "Extrusion4", "Extrusion5", "Extrusion6", "Rundung1", "Bohrung1", "Bohrung2"
sketch "Skizze7" plane through (0, -15, 9.75) normal (0, 0, -1) x (-1, 0, 0)
  line L0 (0, 81) -> (0, 0) projected
  line L1 (32, 0) -> (0, 0) projected
  line L2 (32, 81) -> (32, 0) projected
  line L3 (0, 81) -> (32, 81) projected
  point P0 (0, 15)
extrude "Extrusion7" add sketch "Skizze7" along normal blind 1
fillet "Rundung2" radius 1 4 edges at (-44, 25.5, 12.75) (-16, -17, 12.75) (12, 25.5, 12.75) (-16, 68, 12.75)
sketch "Skizze9" plane through (0, -15, 8.75) normal (0, 0, -1) x (-1, 0, 0)
  line L0 (0, 81) -> (32, 81) construction
  line L1 (16, 81) -> (16, 32.5) construction
  line L2 (16, 32.5) -> (16, 7.5) construction
  line L3 (16, 7.5) -> (16, 0) construction
  line L4 (32, 0) -> (0, 0) construction
  point P0 (0, 15)
  dimension "d44" = 25
  dimension "d52" = 7.5
hole "Bohrung3" at (-16, 17.5, 8.75) at (-16, -7.5, 8.75) direction (0, 0, 1) diameter 3.4 end through all countersink diameter 7.5 countersink angle 90 clearance for "Innensechskant-Senkkopfschraube ISO 10642" size "M3" standard "ISO"
equation "\"d10\" = b"
properties part number "BatteryCase_Botton"
